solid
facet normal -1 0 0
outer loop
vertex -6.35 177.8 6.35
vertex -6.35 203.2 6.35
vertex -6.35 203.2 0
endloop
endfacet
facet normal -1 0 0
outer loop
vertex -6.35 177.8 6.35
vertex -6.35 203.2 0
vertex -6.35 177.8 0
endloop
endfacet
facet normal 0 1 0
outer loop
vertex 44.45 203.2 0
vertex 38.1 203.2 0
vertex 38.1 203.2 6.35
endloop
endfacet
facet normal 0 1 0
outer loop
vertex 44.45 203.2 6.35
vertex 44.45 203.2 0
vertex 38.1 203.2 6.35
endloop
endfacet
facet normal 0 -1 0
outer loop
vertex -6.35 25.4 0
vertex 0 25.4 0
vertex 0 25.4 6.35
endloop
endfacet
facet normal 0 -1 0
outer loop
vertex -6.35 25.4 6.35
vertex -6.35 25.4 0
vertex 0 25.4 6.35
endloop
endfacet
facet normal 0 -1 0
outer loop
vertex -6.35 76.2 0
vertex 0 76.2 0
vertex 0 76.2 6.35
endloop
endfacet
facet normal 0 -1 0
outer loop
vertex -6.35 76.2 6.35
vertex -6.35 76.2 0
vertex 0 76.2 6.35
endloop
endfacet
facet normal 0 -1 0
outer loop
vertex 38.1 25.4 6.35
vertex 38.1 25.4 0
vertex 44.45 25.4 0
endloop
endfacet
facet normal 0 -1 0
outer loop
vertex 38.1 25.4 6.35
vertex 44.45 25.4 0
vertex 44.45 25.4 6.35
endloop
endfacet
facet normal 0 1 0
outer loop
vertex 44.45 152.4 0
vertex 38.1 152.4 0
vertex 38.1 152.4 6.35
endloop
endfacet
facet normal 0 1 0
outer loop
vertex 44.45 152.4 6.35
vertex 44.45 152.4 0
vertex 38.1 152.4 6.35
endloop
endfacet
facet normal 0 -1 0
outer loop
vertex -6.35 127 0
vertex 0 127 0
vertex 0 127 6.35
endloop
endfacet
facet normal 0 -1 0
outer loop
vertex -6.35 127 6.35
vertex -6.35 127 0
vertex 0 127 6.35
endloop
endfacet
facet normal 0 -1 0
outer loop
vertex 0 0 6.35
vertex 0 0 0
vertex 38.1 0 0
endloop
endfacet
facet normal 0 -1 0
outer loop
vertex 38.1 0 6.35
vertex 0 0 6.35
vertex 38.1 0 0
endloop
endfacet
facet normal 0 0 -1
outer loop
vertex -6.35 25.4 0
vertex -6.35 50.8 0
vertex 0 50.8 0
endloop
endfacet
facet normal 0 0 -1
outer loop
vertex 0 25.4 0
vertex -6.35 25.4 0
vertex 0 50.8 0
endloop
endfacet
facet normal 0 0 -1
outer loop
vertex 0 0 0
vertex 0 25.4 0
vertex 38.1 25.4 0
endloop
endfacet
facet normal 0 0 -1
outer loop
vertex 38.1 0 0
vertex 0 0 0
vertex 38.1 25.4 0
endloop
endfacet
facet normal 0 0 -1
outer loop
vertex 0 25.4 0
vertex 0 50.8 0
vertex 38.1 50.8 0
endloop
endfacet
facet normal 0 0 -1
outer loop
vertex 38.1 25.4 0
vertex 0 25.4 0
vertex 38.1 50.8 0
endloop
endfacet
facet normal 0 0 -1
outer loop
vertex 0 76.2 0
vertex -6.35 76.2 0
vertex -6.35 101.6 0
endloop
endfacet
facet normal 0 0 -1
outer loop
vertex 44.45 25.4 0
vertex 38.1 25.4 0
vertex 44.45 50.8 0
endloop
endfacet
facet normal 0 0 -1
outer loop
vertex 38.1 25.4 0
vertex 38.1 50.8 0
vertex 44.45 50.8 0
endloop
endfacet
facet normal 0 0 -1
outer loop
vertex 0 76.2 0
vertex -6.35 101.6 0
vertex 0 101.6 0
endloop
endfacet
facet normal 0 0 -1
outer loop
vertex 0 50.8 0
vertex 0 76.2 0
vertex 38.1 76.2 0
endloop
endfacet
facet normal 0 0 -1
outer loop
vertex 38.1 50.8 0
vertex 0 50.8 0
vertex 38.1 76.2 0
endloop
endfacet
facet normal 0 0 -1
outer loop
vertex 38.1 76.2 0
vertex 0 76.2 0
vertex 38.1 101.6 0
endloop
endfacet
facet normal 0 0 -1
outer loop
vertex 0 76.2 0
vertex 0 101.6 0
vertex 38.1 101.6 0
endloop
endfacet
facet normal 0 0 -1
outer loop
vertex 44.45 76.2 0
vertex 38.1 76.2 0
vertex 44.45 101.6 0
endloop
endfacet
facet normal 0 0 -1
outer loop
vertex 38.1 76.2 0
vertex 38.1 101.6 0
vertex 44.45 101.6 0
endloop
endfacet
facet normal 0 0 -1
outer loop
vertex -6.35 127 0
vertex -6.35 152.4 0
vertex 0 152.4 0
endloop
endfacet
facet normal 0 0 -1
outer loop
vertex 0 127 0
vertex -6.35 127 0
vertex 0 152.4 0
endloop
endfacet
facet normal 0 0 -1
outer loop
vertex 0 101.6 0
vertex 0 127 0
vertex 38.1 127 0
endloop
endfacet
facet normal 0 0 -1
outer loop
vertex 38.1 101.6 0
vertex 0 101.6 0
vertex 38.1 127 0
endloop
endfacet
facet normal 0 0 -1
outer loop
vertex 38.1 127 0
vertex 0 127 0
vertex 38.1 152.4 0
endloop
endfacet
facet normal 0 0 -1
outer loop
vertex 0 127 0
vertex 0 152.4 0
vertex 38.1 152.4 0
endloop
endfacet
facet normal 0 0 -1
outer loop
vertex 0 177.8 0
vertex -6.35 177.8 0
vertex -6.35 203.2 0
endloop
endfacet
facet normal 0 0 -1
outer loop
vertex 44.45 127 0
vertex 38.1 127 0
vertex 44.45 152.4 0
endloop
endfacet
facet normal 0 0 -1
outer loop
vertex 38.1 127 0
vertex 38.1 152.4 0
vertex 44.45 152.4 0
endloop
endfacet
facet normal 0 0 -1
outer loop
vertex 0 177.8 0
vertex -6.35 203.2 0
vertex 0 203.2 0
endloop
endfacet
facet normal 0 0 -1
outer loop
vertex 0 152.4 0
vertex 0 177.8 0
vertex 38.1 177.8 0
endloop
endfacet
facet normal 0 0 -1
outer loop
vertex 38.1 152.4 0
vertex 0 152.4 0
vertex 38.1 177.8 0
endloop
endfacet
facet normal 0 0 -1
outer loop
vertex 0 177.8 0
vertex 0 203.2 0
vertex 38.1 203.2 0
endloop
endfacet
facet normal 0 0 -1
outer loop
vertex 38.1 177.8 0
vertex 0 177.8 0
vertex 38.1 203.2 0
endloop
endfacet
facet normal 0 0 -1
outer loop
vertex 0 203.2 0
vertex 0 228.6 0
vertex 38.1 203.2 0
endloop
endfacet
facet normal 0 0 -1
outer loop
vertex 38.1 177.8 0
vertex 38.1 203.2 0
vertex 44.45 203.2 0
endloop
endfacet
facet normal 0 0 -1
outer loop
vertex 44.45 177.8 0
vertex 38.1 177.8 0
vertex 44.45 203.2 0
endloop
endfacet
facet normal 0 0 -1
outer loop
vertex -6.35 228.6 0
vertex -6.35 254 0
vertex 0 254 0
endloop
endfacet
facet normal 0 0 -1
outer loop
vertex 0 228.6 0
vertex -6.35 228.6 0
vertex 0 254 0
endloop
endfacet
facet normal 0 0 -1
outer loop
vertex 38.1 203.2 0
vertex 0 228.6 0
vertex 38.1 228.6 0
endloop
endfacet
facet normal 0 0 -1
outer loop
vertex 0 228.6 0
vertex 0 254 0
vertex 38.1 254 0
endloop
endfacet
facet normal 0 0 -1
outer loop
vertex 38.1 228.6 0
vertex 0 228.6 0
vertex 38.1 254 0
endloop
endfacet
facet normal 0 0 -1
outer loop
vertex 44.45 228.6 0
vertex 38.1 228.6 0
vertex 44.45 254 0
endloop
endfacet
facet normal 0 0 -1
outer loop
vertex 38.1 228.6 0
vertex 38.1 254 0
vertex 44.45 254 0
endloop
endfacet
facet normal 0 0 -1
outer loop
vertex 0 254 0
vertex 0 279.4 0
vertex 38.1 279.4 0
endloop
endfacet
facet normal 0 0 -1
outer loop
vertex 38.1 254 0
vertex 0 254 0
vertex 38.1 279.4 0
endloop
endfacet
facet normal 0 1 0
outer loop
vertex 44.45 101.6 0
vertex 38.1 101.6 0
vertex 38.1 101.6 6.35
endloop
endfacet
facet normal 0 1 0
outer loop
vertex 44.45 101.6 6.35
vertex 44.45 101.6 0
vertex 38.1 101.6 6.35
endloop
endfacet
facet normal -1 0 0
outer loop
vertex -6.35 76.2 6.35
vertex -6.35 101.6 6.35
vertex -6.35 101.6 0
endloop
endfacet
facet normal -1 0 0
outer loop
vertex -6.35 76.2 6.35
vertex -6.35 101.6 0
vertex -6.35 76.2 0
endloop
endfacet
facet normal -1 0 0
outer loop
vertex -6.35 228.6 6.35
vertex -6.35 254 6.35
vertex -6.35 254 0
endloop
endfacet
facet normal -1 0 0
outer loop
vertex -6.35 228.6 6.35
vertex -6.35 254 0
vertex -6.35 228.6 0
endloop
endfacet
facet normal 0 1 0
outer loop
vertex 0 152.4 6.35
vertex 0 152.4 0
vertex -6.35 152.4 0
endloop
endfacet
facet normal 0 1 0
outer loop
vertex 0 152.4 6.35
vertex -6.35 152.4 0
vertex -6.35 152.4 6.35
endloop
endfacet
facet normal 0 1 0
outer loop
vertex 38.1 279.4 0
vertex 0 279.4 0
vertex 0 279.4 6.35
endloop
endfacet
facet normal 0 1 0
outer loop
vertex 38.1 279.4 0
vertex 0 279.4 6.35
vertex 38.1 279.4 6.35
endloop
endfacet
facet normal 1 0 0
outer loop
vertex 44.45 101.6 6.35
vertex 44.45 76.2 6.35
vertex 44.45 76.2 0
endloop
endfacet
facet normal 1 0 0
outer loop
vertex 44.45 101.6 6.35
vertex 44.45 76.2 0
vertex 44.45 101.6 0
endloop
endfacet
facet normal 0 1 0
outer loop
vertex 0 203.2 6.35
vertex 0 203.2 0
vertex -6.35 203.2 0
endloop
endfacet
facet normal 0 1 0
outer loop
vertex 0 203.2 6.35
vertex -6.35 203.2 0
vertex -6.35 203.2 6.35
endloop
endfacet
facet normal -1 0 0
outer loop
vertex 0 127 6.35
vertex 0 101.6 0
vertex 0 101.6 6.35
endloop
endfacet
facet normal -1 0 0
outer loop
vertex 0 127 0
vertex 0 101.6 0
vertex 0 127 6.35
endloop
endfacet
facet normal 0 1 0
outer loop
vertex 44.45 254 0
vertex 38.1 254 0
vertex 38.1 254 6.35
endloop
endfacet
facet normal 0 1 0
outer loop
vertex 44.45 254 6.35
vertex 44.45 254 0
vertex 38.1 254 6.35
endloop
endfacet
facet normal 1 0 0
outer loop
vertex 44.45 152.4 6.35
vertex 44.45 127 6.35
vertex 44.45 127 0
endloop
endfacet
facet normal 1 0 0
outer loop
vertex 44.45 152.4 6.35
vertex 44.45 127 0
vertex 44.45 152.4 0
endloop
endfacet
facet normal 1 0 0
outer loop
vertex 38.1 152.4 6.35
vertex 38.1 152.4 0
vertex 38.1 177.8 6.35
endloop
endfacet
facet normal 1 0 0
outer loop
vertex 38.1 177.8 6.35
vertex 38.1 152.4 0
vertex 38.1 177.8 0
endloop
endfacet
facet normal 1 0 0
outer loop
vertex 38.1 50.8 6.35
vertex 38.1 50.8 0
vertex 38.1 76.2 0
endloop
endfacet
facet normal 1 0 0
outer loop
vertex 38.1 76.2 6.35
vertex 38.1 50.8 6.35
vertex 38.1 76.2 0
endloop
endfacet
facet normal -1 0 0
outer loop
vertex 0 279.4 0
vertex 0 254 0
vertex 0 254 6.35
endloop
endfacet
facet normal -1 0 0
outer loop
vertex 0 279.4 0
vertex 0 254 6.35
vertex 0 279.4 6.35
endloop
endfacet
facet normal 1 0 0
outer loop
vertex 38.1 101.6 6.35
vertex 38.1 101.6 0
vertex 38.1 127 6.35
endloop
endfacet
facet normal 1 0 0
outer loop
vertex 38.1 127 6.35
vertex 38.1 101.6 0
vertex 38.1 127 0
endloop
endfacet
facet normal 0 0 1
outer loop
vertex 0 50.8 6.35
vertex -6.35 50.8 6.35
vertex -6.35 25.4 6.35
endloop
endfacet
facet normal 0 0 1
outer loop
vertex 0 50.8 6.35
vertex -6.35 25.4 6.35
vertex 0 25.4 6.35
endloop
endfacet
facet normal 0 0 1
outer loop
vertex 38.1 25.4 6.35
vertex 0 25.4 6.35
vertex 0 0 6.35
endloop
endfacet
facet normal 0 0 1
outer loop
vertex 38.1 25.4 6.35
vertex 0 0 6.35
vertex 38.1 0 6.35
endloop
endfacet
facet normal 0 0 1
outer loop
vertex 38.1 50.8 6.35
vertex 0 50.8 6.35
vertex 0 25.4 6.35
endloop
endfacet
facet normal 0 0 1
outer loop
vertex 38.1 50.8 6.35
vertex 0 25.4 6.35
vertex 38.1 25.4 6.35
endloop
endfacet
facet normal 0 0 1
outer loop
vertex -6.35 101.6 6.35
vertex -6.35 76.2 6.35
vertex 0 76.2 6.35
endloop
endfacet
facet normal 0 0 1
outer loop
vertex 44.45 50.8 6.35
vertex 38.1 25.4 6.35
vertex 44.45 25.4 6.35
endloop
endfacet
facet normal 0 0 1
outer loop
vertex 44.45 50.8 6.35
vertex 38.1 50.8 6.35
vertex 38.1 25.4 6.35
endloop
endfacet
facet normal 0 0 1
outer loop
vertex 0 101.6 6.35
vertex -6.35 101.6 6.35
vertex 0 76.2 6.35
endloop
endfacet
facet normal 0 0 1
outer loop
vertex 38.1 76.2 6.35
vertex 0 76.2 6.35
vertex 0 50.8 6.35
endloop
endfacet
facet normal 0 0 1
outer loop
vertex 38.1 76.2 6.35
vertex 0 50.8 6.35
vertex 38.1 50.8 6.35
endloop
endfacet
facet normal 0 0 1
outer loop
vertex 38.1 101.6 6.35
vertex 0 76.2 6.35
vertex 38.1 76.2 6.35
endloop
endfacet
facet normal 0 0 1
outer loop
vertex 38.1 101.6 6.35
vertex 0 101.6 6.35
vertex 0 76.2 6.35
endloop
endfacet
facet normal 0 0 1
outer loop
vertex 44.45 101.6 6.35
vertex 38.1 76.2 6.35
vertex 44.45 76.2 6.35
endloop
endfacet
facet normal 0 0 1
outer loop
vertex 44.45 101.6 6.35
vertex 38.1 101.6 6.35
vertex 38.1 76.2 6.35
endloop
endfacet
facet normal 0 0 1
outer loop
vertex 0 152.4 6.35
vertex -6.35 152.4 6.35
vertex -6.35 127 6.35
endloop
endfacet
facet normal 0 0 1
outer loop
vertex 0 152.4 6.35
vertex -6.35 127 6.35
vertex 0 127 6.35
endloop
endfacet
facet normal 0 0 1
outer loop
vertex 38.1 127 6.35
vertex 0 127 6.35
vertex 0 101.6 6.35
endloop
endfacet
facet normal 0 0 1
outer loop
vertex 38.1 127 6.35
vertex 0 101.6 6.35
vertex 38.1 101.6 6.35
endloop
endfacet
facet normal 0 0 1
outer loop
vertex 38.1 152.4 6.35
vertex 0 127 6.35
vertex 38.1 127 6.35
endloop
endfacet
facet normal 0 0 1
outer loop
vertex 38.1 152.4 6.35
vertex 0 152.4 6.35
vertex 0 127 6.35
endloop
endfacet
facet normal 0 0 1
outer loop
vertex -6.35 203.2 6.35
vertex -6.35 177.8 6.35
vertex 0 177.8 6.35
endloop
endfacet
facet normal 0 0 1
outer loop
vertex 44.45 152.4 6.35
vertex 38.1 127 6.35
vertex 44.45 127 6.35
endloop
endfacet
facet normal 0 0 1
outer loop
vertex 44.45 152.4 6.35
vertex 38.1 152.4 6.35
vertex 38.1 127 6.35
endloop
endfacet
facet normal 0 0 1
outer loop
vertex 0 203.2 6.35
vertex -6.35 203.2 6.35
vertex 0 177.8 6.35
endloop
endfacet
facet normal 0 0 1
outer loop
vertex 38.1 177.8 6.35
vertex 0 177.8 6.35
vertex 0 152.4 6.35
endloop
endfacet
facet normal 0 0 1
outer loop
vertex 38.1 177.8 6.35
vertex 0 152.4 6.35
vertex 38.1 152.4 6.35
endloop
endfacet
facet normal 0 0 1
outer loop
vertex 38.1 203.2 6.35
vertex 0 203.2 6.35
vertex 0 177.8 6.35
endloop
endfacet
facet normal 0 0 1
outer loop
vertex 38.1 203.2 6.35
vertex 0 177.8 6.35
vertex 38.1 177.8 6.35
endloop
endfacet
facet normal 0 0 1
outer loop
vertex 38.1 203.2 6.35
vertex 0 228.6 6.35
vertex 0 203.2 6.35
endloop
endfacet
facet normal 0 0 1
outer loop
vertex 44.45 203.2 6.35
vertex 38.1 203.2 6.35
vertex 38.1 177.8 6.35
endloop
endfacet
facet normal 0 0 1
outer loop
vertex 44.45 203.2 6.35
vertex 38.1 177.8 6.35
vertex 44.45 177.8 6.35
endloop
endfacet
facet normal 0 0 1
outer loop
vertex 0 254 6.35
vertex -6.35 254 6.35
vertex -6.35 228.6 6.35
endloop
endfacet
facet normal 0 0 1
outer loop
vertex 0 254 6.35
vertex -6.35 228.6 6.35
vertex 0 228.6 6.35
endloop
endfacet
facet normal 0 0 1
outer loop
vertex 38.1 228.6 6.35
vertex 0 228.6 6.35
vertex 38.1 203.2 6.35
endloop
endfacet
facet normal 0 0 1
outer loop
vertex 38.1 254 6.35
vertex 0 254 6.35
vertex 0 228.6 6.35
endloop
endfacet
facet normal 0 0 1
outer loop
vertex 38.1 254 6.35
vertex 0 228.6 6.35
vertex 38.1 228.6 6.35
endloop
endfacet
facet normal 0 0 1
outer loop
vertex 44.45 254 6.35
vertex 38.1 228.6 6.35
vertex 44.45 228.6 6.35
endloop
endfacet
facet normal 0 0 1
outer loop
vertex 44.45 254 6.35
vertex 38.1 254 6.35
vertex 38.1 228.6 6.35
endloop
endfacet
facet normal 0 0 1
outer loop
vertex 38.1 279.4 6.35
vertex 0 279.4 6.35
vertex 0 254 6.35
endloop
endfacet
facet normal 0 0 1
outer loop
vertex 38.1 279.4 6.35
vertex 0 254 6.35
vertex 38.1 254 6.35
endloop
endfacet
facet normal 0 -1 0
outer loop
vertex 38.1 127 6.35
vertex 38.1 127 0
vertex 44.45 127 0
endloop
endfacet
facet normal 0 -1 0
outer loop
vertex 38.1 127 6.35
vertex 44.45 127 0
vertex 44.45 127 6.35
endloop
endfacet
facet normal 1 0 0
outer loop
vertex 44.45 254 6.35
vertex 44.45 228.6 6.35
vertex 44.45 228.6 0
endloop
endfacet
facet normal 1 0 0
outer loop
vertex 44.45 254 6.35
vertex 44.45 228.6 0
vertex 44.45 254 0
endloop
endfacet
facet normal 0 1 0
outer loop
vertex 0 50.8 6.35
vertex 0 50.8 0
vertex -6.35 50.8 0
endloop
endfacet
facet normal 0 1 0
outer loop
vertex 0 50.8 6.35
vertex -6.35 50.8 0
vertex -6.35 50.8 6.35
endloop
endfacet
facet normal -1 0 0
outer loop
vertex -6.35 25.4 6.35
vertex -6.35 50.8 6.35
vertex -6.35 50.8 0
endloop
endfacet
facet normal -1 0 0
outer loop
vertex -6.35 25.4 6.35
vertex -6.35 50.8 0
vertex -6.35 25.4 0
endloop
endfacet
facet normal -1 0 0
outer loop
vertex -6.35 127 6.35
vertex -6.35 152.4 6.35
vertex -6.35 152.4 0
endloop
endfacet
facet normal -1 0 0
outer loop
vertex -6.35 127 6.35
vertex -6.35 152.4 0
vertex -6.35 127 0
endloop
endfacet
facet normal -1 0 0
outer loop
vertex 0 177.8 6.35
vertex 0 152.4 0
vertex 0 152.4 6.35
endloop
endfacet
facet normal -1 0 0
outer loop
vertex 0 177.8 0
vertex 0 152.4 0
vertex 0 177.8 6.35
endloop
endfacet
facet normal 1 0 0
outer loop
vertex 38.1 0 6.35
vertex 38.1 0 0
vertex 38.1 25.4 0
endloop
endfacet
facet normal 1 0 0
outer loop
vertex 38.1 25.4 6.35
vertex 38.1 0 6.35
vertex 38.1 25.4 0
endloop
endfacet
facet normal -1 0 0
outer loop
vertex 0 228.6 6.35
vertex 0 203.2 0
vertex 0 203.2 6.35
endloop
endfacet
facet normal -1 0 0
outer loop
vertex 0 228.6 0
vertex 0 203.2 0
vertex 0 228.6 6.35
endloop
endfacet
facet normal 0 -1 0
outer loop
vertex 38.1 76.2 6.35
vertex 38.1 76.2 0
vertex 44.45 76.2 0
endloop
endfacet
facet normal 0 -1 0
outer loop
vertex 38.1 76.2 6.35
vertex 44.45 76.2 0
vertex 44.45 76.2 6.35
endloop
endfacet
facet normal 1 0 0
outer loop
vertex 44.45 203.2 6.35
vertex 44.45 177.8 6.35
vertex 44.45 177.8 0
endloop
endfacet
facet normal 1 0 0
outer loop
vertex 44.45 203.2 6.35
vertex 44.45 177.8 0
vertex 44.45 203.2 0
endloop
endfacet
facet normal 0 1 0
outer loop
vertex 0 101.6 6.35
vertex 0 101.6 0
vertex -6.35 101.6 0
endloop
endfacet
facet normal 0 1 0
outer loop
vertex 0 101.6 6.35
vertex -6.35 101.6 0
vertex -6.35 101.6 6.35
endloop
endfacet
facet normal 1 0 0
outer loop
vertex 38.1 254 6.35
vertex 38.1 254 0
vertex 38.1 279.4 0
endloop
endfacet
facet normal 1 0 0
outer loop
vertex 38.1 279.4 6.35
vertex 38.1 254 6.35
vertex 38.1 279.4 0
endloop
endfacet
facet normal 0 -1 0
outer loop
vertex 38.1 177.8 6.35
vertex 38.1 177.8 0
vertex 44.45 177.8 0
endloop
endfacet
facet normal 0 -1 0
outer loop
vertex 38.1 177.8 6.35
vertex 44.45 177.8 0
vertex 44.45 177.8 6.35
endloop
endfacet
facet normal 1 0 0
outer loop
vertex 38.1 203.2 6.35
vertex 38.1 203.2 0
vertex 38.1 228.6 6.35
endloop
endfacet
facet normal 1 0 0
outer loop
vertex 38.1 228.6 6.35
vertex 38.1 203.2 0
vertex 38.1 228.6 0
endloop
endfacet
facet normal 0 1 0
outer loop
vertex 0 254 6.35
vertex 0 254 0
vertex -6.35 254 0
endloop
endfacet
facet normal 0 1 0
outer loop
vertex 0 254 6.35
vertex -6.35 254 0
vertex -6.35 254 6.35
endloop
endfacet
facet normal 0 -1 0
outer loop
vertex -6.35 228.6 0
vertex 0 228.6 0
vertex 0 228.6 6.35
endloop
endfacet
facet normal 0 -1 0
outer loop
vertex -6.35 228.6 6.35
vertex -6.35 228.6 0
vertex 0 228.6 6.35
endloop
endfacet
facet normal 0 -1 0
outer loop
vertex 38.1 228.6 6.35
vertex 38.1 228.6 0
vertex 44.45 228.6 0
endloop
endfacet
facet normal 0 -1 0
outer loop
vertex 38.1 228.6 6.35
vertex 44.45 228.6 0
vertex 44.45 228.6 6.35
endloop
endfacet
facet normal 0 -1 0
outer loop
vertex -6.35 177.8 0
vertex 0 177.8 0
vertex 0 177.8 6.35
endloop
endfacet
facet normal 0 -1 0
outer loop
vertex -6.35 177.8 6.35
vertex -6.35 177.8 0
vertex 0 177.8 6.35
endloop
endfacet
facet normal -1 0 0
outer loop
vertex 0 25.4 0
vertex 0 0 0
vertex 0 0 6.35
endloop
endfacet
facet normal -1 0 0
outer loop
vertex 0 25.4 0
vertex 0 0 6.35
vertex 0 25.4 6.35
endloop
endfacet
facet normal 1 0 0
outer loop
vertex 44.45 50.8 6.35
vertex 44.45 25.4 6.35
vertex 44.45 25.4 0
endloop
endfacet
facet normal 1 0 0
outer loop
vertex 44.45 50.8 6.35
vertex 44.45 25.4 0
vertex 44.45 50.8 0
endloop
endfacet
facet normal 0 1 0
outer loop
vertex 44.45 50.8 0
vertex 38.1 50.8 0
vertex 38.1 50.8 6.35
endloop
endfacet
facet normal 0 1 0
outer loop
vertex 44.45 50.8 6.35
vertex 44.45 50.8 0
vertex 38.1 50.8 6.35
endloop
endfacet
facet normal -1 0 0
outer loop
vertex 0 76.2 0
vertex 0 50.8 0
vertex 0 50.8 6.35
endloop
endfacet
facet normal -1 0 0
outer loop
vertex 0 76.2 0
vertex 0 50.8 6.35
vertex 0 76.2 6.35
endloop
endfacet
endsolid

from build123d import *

# Parameters (mm, degrees)
F0_W     = 38.1
F0_H     = 279.4
F1_DEPTH = 6.35
F2_W     = 25.4
F2_H     = 6.35
F4_DEPTH = 6.35
F3_W     = 25.4
F3_H     = 6.35
F5_DEPTH = 6.35


with BuildPart() as f1:
    # F0 (on Top) → F1 (new body)
    with BuildSketch(Plane.XY):
        with Locations((19.05, 139.7)):
            Rectangle(F0_W, F0_H)
    extrude(amount=F1_DEPTH)

    # F2 (on face) → F4 (join)
    with BuildSketch(Plane.YZ.offset(38.1)):
        with Locations((241.3, 3.175)):
            Rectangle(F2_W, F2_H)
        with Locations((190.5, 3.175)):
            Rectangle(F2_W, F2_H)
        with Locations((139.7, 3.175)):
            Rectangle(F2_W, F2_H)
        with Locations((88.9, 3.175)):
            Rectangle(F2_W, F2_H)
        with Locations((38.1, 3.175)):
            Rectangle(F2_W, F2_H)
    extrude(amount=F4_DEPTH)

    # F3 (on face) → F5 (join)
    with BuildSketch(Plane(origin=(0, 0, 0), x_dir=(0, -1, 0), z_dir=(-1, 0, 0))):
        with Locations((-38.1, 3.175)):
            Rectangle(F3_W, F3_H)
        with Locations((-88.9, 3.175)):
            Rectangle(F3_W, F3_H)
        with Locations((-139.7, 3.175)):
            Rectangle(F3_W, F3_H)
        with Locations((-190.5, 3.175)):
            Rectangle(F3_W, F3_H)
        with Locations((-241.3, 3.175)):
            Rectangle(F3_W, F3_H)
    extrude(amount=F5_DEPTH)


solid = f1.part
